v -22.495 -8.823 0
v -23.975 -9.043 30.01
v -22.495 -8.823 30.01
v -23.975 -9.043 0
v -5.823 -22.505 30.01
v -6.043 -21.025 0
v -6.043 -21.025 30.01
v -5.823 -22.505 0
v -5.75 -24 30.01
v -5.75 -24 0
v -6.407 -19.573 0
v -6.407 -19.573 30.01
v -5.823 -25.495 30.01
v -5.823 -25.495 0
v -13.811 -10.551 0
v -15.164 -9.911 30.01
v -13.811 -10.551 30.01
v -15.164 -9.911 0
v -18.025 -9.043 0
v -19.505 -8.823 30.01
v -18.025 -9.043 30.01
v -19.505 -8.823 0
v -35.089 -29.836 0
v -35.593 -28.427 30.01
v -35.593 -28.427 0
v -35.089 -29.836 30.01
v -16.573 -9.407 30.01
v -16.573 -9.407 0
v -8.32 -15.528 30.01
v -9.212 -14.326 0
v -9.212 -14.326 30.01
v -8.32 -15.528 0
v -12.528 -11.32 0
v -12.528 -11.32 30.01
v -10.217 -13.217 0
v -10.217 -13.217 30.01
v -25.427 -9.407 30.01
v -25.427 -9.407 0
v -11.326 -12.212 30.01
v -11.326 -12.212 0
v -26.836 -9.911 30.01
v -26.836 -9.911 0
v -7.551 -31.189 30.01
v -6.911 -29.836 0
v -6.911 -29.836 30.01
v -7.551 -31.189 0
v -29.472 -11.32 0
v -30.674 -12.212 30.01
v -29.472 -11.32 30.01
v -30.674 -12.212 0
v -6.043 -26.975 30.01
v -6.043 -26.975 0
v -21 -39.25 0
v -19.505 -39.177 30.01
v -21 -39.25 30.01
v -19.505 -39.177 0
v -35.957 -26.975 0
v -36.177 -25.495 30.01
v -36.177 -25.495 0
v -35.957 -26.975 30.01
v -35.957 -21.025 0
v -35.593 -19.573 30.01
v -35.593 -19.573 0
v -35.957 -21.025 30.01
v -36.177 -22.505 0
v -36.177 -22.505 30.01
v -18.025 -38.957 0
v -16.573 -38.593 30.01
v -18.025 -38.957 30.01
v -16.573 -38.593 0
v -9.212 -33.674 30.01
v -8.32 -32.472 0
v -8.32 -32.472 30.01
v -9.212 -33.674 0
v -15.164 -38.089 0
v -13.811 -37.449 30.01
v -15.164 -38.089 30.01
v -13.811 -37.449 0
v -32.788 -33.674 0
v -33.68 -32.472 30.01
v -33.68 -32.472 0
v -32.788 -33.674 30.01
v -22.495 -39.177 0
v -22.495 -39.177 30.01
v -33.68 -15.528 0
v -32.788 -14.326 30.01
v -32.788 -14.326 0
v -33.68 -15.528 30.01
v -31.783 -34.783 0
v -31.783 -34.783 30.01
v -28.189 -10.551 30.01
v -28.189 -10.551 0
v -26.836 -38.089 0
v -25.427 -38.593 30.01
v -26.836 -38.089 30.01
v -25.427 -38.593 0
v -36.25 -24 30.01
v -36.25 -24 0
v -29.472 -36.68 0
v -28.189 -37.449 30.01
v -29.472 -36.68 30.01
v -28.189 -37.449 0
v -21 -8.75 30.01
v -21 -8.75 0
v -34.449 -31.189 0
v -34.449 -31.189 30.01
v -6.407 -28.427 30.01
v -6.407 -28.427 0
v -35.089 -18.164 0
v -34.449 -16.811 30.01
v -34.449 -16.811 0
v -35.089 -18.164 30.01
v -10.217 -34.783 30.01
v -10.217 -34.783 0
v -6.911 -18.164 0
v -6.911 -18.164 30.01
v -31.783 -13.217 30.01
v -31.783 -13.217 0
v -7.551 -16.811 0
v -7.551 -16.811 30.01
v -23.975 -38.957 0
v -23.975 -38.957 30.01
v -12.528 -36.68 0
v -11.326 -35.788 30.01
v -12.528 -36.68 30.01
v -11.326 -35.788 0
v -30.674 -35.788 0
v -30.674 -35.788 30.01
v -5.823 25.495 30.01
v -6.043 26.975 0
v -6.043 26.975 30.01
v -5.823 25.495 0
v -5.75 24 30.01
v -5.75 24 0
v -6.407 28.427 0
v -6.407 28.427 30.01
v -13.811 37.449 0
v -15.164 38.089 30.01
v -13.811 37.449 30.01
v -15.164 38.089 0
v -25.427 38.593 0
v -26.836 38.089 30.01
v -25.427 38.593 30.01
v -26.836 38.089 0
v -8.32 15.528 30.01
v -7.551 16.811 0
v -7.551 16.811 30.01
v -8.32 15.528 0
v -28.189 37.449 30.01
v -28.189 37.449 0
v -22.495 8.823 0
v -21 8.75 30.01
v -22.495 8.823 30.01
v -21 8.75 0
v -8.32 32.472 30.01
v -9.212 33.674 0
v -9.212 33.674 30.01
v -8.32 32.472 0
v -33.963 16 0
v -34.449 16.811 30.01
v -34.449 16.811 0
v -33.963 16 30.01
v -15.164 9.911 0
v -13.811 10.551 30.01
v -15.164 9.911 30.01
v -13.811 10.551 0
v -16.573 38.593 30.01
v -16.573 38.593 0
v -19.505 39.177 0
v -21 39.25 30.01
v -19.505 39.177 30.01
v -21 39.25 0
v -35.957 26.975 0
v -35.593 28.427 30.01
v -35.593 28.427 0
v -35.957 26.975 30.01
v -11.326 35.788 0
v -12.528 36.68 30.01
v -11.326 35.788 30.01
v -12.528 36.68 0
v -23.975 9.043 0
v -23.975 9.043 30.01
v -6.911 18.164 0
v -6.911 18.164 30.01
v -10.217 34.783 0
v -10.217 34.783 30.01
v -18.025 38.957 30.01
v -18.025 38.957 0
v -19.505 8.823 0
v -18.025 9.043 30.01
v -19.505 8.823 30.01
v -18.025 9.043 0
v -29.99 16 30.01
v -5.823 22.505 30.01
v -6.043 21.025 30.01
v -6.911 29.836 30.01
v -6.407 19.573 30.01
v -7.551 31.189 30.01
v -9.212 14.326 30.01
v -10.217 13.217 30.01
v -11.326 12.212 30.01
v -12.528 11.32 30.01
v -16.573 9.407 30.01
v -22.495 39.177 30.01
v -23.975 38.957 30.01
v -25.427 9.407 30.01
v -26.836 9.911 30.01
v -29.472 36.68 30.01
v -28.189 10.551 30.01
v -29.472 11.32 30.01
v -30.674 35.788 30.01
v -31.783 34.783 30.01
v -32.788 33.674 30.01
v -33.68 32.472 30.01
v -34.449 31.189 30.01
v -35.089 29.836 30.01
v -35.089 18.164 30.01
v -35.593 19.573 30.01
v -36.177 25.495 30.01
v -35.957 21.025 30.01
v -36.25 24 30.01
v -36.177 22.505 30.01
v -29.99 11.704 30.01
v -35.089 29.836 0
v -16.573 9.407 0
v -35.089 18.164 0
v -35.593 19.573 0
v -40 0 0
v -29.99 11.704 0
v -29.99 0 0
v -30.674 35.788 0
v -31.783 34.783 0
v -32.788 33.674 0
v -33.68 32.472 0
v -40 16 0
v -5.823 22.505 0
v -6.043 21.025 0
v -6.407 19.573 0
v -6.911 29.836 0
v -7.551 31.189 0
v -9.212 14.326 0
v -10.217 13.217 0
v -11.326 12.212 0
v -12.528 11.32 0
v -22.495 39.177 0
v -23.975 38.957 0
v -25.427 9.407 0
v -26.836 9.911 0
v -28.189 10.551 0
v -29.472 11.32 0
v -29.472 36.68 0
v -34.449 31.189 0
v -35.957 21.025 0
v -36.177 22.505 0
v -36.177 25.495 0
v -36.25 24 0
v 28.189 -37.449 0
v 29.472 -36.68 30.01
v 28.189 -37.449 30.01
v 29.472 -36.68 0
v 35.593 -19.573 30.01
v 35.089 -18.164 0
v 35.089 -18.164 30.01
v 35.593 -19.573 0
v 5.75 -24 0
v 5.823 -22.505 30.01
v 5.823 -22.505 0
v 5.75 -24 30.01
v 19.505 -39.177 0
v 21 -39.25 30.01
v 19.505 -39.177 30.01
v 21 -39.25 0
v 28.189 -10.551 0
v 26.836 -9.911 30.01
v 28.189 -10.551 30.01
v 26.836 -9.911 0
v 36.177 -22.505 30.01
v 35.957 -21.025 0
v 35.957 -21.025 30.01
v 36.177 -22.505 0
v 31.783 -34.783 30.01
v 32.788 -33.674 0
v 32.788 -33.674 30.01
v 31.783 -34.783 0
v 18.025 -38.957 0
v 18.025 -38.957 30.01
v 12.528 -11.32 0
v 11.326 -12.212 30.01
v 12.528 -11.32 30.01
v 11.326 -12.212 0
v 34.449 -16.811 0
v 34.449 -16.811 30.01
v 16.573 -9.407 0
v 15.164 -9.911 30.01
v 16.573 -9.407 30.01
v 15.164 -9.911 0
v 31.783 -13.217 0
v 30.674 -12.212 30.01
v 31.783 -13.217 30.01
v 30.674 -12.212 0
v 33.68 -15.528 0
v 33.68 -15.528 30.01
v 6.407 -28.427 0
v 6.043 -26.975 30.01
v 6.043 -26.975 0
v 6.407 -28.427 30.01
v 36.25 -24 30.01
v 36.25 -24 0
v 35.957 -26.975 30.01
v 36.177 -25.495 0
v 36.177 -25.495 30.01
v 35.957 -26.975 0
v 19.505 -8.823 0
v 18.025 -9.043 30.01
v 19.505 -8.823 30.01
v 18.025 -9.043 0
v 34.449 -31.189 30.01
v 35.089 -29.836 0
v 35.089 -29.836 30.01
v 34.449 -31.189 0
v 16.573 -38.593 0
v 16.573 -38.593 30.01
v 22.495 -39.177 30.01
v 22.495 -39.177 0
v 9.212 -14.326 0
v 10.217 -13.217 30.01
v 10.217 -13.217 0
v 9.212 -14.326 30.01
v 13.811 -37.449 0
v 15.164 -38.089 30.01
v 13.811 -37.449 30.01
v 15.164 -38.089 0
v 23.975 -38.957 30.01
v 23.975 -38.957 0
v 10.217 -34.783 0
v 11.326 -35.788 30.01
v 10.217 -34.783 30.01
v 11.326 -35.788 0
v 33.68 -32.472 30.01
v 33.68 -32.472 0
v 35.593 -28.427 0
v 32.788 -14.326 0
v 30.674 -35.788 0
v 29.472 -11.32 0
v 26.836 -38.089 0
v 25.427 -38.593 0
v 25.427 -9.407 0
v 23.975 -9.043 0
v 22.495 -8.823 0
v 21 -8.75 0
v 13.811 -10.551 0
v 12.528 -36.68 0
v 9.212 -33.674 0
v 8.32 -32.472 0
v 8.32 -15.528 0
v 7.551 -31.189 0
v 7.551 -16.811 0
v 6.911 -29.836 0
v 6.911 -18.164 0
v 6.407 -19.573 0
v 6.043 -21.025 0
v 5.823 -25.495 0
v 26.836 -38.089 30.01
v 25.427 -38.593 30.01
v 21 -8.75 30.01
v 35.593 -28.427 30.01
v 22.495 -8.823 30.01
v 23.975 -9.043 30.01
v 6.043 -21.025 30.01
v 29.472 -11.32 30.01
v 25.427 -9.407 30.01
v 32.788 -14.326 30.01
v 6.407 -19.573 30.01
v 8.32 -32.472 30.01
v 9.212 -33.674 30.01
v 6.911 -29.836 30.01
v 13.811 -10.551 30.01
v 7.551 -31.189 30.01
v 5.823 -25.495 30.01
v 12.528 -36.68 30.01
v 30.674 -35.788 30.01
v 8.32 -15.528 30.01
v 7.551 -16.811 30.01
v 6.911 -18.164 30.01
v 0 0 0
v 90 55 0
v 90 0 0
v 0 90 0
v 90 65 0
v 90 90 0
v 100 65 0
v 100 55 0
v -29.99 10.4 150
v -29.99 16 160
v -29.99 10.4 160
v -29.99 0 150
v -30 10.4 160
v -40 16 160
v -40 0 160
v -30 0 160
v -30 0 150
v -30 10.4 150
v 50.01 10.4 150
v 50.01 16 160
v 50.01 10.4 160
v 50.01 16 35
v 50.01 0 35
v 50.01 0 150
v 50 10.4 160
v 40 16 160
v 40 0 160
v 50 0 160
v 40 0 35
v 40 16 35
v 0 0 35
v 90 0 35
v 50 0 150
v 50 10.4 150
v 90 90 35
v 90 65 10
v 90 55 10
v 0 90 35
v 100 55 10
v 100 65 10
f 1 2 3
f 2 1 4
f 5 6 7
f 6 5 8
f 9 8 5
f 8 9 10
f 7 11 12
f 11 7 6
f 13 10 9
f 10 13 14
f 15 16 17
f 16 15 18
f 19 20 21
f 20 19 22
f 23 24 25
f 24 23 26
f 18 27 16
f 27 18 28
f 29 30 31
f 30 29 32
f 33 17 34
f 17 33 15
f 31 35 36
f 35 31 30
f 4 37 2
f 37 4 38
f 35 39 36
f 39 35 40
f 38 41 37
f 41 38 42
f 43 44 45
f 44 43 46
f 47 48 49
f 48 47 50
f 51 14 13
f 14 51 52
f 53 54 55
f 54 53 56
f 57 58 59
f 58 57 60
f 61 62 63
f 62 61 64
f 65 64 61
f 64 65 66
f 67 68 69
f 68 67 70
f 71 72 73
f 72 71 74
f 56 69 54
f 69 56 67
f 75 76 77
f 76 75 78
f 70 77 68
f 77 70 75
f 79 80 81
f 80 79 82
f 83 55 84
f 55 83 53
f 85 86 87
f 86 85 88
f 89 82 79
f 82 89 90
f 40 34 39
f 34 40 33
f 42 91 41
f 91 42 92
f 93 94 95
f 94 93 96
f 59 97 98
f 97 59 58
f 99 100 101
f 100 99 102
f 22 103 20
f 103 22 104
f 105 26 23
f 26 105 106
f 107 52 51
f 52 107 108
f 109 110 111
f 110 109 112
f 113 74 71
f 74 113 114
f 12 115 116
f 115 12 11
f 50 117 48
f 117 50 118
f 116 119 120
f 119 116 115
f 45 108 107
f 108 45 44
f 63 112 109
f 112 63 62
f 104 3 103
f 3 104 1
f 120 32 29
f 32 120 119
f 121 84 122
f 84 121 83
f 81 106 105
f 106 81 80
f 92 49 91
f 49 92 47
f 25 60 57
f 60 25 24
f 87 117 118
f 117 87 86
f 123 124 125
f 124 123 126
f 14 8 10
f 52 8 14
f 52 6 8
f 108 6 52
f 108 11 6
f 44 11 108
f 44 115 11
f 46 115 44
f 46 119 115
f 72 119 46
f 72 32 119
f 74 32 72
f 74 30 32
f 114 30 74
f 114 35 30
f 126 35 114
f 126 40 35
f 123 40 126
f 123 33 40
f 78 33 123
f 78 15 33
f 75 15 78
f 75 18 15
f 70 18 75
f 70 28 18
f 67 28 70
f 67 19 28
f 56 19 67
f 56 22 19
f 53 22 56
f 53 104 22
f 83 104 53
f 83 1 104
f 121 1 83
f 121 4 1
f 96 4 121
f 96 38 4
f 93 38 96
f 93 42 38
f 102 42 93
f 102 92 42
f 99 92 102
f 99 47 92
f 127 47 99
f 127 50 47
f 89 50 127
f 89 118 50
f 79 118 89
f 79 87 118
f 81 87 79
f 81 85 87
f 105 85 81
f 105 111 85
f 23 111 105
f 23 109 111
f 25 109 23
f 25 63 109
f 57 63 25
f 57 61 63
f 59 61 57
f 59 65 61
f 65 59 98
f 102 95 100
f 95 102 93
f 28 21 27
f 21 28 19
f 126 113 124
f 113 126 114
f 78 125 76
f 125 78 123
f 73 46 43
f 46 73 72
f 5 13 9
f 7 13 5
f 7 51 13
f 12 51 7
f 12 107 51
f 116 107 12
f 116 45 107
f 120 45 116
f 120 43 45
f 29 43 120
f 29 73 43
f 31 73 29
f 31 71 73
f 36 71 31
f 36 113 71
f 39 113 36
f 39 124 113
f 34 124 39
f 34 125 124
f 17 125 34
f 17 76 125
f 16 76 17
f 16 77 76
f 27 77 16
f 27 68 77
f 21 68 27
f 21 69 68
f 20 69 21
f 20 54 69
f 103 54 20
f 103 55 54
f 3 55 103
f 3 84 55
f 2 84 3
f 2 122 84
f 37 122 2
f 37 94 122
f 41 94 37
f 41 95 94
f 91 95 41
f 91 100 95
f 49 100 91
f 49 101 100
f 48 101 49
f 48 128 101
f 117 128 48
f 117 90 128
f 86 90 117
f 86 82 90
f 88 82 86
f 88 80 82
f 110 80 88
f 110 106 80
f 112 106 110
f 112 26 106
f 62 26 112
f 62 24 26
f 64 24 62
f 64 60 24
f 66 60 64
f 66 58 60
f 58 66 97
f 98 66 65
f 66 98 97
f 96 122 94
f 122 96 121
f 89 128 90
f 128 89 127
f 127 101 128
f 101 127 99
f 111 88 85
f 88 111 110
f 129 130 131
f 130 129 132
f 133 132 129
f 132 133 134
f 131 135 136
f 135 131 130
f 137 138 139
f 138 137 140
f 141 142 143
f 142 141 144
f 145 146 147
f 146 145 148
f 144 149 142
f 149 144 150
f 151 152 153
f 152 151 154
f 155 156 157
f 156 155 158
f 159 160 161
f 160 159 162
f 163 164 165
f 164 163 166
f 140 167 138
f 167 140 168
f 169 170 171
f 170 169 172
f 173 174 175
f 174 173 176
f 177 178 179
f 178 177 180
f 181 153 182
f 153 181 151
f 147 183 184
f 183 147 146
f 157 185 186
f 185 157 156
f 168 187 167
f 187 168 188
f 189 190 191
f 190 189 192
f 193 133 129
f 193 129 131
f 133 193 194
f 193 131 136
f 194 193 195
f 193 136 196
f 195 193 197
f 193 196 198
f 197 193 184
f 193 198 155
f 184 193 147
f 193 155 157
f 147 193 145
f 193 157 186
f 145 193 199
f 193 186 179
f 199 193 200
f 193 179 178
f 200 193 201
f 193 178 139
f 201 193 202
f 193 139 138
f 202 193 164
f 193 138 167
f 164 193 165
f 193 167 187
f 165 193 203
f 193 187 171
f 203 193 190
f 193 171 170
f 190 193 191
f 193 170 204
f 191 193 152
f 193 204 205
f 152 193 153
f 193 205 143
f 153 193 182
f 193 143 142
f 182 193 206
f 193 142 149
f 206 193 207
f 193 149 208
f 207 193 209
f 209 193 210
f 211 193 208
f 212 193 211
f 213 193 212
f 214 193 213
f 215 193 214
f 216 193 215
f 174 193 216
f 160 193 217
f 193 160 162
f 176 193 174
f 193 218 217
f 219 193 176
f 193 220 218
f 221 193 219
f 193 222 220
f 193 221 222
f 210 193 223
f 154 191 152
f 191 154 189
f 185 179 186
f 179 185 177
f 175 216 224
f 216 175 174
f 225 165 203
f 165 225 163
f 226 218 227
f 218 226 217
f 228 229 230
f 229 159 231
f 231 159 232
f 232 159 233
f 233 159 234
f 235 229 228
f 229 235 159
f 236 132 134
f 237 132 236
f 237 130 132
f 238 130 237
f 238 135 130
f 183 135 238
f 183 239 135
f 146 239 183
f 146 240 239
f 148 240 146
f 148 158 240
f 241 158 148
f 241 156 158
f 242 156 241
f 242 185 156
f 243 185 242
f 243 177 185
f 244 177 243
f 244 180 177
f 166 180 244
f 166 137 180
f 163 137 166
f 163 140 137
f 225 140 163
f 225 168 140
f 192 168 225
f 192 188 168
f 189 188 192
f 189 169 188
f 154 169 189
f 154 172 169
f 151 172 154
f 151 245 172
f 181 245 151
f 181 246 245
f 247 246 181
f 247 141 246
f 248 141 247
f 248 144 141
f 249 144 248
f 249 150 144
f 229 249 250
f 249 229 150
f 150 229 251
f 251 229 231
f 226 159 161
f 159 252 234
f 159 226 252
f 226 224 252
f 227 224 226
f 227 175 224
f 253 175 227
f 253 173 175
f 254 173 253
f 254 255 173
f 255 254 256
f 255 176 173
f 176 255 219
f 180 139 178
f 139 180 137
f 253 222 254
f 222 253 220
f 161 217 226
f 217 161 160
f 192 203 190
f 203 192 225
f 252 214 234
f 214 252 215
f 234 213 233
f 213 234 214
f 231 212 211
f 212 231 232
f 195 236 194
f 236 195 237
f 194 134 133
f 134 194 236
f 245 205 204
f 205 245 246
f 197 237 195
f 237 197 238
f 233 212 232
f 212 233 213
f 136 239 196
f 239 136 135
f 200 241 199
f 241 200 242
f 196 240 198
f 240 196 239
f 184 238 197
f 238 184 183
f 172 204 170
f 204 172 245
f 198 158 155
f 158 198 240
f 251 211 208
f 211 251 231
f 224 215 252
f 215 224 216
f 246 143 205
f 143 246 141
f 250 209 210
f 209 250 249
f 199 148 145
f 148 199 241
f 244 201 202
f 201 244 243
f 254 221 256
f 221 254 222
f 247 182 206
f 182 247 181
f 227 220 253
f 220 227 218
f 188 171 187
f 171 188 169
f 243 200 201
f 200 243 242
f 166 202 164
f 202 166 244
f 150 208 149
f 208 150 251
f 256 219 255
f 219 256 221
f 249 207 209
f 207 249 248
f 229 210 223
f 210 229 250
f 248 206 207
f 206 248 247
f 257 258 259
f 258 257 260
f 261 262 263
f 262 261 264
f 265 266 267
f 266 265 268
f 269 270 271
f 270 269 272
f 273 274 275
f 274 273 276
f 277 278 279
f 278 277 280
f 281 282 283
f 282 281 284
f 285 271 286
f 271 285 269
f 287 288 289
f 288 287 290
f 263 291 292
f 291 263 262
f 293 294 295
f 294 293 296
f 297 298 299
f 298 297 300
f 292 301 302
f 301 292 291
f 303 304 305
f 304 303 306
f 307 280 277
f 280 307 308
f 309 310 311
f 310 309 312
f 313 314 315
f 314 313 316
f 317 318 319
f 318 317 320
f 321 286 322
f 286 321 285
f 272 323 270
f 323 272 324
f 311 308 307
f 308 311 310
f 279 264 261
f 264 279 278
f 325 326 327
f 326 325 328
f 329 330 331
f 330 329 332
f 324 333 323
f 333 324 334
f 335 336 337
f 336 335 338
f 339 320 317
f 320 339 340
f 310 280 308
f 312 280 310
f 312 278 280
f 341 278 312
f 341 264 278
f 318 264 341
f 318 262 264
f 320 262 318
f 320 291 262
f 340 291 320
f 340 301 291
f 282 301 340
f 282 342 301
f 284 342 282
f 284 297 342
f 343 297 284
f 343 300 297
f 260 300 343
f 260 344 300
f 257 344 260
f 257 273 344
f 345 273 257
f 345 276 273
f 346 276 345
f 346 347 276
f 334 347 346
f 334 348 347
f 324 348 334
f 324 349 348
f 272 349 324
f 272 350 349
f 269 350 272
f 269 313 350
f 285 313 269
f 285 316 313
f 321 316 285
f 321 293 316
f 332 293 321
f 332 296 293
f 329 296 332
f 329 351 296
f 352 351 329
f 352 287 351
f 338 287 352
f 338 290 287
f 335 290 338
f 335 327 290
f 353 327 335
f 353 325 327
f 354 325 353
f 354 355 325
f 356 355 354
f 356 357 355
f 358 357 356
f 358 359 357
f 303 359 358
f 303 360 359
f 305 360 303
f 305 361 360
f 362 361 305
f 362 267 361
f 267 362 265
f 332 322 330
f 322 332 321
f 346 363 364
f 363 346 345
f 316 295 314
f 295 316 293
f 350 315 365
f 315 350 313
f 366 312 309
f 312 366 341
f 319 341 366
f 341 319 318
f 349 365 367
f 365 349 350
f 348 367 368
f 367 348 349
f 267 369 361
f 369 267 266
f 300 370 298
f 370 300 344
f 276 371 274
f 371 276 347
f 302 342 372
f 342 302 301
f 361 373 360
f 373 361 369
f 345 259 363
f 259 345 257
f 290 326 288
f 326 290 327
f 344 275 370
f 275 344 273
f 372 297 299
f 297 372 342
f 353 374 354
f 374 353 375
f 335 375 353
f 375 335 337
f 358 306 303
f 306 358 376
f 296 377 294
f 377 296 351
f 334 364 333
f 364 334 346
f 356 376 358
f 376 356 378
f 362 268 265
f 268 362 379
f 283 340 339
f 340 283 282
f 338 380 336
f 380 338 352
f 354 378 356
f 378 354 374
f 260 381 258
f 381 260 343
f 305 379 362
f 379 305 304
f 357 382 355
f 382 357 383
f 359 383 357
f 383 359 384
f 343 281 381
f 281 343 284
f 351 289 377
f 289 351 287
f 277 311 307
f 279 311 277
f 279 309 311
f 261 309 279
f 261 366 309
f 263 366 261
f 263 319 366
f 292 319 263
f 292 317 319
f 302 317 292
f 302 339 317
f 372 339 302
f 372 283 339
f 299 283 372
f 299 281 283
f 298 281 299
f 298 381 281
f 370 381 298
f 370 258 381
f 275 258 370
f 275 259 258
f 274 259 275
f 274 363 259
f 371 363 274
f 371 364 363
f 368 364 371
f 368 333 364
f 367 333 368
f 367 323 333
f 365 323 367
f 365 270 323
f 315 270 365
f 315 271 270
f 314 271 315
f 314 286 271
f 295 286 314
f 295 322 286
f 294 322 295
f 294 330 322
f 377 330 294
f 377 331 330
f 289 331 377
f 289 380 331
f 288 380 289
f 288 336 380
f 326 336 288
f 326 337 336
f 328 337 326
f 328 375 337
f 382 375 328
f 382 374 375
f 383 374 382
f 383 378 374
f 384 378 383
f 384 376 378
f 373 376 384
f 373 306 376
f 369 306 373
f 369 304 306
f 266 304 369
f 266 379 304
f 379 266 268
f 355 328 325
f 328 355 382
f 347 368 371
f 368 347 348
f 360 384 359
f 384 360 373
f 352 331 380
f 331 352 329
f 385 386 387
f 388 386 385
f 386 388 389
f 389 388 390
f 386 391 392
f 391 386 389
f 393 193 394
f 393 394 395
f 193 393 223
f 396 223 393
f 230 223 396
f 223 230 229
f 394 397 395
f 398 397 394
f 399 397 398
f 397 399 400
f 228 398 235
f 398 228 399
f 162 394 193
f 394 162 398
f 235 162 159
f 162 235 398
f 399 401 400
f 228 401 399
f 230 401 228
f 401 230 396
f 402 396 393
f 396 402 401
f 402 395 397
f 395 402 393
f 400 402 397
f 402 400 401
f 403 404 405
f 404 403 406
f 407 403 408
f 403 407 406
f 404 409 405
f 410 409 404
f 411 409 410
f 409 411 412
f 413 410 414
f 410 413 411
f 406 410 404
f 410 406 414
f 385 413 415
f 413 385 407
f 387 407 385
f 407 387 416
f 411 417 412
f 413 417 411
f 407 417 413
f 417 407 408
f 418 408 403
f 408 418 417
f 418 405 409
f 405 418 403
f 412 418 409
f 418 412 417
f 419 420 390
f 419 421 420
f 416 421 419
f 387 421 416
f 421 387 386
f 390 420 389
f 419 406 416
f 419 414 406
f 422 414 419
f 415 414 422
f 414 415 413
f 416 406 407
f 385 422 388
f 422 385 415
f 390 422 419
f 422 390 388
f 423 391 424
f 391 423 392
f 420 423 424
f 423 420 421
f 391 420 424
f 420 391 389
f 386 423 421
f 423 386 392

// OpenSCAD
// 4x 50 mL conical tube carrier, two parts printed side by side
// Part 1: base block + two posts with through square holes
// Part 2: handle bar (printed separately, inserted through posts)

$fn = 64;

// ---- Part 1: base block ----
base_w  = 90;   // X width
base_d  = 90;   // Y depth
base_h  = 35;   // Z height

// Blind tube seats
seat_d  = 30.5; // diameter
seat_depth = 30; // depth (5 mm floor)
seat_x  = 21;   // +/- X centre
seat_y  = 24;   // +/- Y centre

// ---- Part 1: posts ----
post_x  = 10;   // thickness along X
post_y  = 16;   // width along Y
post_z  = 160;  // top height
hole_x  = 10.4; // square hole side, along X
hole_y  = 10.4; // square hole side, along Y
hole_z  = 150;  // hole centre height

// ---- Part 2: handle bar ----
bar_w   = 10;   // X width
bar_d   = 10;   // Y depth
bar_l   = 100;  // length along X
bar_y   = 55;   // bar centre Y (spans 55..65, 10 mm gap from base +Y face at 45)

// ===================== PART 1 =====================
translate([0, 0, 0]) {
    // Base block
    cube([base_w, base_d, base_h], center = [0, 0, base_h/2]);

    // Four blind tube seats
    for (xx = [-1, 1]) {
        for (yy = [-1, 1]) {
            translate([xx * seat_x, yy * seat_y, 0]) {
                difference() {
                    cylinder(d = seat_d, h = seat_depth + 0.01, center = [0, 0, seat_depth/2]);
                    // floor is implicit (cylinder stops at seat_depth)
                }
            }
        }
    }

    // Two posts at X ends, flush with end faces
    for (xx = [-1, 1]) {
        translate([xx * (base_w/2 - post_x/2), 0, 0]) {
            cube([post_x, post_y, post_z], center = [0, 0, post_z/2]);

            // Square through-hole along X, centred at z = hole_z
            difference() {
                cube([post_x + 0.01, post_y, post_z], center = [0, 0, post_z/2]);
                translate([0, 0, hole_z]) {
                    cube([hole_x, hole_y, post_z + 0.01], center = [0, 0, 0]);
                }
            }
        }
    }
}

// ===================== PART 2: handle bar =====================
translate([0, bar_y, 0]) {
    cube([bar_l, bar_d, bar_w], center = [0, 0, bar_w/2]);
}
